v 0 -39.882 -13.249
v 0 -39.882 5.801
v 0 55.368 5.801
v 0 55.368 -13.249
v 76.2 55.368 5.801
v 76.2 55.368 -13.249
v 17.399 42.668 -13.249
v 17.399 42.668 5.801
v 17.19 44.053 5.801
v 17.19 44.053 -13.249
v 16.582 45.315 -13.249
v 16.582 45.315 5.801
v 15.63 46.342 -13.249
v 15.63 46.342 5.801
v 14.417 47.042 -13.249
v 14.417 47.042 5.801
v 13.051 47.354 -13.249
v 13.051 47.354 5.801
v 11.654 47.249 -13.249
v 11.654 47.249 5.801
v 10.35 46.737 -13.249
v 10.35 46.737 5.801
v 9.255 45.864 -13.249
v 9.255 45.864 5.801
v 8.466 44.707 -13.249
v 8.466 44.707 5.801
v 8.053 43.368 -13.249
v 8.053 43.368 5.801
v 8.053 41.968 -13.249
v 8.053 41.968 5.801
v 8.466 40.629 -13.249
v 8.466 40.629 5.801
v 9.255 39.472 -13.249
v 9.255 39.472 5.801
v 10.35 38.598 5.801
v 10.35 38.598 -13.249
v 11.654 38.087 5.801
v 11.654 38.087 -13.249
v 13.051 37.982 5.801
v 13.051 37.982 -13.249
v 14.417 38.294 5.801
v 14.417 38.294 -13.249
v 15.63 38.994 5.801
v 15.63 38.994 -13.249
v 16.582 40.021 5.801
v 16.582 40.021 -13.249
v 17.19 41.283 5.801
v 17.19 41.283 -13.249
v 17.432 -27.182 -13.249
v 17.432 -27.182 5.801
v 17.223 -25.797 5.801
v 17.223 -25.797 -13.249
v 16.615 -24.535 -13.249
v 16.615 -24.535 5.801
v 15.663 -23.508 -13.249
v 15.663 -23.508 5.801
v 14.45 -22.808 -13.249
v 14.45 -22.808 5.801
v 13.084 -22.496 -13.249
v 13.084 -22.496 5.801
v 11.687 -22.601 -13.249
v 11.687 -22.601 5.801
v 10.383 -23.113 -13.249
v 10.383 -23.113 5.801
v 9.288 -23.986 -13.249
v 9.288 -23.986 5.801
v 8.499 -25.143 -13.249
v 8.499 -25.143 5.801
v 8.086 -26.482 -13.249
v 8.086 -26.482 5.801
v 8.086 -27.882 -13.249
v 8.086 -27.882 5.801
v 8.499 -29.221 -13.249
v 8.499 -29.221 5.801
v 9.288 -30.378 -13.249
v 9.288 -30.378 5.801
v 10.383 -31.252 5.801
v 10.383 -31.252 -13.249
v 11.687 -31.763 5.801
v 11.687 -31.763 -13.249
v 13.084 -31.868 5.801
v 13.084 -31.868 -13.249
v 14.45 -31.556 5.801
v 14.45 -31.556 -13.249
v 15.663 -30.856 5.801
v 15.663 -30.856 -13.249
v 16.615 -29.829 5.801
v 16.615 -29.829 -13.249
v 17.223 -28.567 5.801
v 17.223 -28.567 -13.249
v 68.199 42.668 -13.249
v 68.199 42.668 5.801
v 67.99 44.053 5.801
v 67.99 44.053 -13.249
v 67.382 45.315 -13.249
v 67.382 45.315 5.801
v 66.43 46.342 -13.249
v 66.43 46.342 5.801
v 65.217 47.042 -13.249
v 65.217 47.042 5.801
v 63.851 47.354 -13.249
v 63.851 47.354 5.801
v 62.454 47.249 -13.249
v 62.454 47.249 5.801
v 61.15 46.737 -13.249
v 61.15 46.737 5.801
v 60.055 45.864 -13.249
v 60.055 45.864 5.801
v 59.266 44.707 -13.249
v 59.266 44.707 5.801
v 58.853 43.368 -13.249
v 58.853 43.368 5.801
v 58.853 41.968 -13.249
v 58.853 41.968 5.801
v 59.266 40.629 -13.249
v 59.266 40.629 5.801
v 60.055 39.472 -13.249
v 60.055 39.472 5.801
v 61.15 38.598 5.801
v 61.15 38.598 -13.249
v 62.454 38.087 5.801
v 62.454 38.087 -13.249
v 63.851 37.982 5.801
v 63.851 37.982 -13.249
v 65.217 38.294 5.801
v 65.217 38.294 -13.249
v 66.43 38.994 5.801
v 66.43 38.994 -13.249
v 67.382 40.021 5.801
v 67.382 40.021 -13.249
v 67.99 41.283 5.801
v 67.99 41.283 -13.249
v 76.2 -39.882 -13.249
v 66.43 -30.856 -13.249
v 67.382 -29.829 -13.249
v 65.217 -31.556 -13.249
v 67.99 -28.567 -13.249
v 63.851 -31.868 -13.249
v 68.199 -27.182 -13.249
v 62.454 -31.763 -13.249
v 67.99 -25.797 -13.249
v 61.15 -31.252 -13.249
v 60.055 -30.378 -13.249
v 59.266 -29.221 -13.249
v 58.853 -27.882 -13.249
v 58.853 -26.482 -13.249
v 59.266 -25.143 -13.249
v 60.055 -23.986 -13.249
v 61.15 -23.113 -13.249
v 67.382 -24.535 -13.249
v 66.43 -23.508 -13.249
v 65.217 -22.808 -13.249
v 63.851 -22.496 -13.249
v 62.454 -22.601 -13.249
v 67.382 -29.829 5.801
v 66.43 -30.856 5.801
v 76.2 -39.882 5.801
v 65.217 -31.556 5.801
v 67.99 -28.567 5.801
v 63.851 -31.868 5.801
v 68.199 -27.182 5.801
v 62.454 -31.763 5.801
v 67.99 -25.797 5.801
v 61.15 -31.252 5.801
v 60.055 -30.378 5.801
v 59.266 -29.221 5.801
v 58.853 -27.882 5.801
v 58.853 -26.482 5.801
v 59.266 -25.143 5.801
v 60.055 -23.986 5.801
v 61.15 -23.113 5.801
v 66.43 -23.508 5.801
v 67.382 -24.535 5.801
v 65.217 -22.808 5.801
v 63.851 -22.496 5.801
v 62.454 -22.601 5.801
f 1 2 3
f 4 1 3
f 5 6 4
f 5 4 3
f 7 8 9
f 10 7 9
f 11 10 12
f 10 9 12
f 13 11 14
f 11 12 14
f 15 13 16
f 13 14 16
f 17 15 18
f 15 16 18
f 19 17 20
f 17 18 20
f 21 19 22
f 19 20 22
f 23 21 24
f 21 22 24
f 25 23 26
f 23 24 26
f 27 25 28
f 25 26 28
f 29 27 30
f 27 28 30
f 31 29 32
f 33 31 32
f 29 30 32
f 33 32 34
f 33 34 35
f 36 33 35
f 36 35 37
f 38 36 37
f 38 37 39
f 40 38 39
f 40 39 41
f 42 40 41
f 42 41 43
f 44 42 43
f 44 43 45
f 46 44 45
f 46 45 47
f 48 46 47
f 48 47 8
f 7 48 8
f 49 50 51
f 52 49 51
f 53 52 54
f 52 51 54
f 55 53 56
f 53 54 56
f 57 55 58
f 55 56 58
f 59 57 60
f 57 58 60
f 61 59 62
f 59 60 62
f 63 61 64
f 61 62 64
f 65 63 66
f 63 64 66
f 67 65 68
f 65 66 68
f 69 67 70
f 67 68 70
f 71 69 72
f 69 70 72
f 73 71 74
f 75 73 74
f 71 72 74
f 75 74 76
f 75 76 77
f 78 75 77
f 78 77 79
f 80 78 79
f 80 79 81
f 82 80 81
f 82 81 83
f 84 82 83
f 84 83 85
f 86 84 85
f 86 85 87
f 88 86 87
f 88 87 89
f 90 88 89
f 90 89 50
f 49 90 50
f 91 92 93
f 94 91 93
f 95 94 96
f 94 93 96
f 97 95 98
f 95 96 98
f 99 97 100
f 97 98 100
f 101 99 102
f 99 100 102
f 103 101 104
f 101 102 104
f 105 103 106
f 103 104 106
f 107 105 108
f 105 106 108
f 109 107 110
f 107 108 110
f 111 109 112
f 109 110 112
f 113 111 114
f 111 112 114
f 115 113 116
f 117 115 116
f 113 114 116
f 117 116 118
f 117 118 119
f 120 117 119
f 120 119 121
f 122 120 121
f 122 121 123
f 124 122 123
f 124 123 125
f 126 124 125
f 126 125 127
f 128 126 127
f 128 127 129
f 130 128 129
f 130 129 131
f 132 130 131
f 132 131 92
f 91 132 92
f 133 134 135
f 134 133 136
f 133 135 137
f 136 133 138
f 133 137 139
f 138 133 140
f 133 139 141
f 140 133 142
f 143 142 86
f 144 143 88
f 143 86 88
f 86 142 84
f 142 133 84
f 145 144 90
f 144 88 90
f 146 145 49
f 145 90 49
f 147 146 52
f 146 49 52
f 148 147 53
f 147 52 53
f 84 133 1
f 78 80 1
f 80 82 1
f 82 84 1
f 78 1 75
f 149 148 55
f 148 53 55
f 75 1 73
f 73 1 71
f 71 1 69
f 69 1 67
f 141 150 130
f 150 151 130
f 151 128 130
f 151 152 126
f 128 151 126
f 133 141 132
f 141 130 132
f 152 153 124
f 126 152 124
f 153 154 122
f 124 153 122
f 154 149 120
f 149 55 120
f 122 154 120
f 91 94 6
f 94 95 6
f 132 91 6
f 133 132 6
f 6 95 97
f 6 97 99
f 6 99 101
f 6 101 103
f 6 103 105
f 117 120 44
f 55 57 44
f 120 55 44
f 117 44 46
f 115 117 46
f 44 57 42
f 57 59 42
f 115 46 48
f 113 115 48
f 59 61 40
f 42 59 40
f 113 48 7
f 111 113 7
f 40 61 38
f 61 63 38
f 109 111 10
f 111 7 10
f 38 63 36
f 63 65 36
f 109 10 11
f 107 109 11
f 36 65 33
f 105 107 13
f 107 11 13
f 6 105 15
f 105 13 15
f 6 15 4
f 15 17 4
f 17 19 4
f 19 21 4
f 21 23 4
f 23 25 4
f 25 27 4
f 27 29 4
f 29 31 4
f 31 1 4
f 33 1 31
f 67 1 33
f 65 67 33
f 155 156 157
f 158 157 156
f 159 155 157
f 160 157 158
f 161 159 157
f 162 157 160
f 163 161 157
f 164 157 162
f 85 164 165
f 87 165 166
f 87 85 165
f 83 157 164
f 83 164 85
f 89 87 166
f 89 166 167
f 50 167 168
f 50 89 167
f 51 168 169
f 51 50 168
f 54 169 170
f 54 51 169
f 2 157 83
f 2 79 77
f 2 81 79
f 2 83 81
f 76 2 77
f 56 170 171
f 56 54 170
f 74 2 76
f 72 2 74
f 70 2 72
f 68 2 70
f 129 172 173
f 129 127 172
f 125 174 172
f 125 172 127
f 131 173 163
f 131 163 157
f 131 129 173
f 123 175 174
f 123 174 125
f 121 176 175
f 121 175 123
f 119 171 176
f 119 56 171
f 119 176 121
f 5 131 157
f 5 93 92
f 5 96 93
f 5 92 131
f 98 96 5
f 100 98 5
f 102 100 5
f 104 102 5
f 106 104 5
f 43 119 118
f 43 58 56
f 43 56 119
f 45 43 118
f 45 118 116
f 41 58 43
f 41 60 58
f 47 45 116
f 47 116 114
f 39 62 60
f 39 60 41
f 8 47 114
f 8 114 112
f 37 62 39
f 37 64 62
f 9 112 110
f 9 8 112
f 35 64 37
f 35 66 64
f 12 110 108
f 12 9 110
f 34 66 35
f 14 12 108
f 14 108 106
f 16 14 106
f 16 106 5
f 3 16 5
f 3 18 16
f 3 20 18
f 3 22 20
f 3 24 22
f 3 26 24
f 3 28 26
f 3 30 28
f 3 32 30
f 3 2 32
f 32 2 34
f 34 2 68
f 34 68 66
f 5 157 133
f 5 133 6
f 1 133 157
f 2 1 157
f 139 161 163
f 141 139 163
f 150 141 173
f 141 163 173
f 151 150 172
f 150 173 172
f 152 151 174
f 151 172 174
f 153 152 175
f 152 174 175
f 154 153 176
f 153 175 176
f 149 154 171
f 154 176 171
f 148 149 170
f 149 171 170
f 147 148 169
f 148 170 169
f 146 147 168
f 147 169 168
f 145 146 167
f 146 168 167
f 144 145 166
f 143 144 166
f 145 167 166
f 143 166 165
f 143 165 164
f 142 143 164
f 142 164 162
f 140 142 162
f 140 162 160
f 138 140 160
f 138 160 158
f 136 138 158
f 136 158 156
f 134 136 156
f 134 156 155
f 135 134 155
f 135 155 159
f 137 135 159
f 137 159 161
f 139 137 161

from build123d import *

# Parameters (mm, degrees)
F0_W     = 95.25
F0_H     = 19.05
F1_DEPTH = 76.2
F2_R     = 4.699
F3_DEPTH = 25.4


with BuildPart() as f1:
    # F0 (on Right) → F1 (new body)
    with BuildSketch(Plane.YZ):
        with Locations((7.742904, -3.723968)):
            Rectangle(F0_W, F0_H)
    extrude(amount=F1_DEPTH)

    # F2 (on face) → F3 (cut)
    with BuildSketch(Plane.XY.offset(5.801032)):
        with Locations((63.5, -27.182096)):
            Circle(F2_R)
        with Locations((12.732774, -27.182096)):
            Circle(F2_R)
        with Locations((12.7, 42.667904)):
            Circle(F2_R)
        with Locations((63.5, 42.667904)):
            Circle(F2_R)
    extrude(amount=-F3_DEPTH, mode=Mode.SUBTRACT)


solid = f1.part
